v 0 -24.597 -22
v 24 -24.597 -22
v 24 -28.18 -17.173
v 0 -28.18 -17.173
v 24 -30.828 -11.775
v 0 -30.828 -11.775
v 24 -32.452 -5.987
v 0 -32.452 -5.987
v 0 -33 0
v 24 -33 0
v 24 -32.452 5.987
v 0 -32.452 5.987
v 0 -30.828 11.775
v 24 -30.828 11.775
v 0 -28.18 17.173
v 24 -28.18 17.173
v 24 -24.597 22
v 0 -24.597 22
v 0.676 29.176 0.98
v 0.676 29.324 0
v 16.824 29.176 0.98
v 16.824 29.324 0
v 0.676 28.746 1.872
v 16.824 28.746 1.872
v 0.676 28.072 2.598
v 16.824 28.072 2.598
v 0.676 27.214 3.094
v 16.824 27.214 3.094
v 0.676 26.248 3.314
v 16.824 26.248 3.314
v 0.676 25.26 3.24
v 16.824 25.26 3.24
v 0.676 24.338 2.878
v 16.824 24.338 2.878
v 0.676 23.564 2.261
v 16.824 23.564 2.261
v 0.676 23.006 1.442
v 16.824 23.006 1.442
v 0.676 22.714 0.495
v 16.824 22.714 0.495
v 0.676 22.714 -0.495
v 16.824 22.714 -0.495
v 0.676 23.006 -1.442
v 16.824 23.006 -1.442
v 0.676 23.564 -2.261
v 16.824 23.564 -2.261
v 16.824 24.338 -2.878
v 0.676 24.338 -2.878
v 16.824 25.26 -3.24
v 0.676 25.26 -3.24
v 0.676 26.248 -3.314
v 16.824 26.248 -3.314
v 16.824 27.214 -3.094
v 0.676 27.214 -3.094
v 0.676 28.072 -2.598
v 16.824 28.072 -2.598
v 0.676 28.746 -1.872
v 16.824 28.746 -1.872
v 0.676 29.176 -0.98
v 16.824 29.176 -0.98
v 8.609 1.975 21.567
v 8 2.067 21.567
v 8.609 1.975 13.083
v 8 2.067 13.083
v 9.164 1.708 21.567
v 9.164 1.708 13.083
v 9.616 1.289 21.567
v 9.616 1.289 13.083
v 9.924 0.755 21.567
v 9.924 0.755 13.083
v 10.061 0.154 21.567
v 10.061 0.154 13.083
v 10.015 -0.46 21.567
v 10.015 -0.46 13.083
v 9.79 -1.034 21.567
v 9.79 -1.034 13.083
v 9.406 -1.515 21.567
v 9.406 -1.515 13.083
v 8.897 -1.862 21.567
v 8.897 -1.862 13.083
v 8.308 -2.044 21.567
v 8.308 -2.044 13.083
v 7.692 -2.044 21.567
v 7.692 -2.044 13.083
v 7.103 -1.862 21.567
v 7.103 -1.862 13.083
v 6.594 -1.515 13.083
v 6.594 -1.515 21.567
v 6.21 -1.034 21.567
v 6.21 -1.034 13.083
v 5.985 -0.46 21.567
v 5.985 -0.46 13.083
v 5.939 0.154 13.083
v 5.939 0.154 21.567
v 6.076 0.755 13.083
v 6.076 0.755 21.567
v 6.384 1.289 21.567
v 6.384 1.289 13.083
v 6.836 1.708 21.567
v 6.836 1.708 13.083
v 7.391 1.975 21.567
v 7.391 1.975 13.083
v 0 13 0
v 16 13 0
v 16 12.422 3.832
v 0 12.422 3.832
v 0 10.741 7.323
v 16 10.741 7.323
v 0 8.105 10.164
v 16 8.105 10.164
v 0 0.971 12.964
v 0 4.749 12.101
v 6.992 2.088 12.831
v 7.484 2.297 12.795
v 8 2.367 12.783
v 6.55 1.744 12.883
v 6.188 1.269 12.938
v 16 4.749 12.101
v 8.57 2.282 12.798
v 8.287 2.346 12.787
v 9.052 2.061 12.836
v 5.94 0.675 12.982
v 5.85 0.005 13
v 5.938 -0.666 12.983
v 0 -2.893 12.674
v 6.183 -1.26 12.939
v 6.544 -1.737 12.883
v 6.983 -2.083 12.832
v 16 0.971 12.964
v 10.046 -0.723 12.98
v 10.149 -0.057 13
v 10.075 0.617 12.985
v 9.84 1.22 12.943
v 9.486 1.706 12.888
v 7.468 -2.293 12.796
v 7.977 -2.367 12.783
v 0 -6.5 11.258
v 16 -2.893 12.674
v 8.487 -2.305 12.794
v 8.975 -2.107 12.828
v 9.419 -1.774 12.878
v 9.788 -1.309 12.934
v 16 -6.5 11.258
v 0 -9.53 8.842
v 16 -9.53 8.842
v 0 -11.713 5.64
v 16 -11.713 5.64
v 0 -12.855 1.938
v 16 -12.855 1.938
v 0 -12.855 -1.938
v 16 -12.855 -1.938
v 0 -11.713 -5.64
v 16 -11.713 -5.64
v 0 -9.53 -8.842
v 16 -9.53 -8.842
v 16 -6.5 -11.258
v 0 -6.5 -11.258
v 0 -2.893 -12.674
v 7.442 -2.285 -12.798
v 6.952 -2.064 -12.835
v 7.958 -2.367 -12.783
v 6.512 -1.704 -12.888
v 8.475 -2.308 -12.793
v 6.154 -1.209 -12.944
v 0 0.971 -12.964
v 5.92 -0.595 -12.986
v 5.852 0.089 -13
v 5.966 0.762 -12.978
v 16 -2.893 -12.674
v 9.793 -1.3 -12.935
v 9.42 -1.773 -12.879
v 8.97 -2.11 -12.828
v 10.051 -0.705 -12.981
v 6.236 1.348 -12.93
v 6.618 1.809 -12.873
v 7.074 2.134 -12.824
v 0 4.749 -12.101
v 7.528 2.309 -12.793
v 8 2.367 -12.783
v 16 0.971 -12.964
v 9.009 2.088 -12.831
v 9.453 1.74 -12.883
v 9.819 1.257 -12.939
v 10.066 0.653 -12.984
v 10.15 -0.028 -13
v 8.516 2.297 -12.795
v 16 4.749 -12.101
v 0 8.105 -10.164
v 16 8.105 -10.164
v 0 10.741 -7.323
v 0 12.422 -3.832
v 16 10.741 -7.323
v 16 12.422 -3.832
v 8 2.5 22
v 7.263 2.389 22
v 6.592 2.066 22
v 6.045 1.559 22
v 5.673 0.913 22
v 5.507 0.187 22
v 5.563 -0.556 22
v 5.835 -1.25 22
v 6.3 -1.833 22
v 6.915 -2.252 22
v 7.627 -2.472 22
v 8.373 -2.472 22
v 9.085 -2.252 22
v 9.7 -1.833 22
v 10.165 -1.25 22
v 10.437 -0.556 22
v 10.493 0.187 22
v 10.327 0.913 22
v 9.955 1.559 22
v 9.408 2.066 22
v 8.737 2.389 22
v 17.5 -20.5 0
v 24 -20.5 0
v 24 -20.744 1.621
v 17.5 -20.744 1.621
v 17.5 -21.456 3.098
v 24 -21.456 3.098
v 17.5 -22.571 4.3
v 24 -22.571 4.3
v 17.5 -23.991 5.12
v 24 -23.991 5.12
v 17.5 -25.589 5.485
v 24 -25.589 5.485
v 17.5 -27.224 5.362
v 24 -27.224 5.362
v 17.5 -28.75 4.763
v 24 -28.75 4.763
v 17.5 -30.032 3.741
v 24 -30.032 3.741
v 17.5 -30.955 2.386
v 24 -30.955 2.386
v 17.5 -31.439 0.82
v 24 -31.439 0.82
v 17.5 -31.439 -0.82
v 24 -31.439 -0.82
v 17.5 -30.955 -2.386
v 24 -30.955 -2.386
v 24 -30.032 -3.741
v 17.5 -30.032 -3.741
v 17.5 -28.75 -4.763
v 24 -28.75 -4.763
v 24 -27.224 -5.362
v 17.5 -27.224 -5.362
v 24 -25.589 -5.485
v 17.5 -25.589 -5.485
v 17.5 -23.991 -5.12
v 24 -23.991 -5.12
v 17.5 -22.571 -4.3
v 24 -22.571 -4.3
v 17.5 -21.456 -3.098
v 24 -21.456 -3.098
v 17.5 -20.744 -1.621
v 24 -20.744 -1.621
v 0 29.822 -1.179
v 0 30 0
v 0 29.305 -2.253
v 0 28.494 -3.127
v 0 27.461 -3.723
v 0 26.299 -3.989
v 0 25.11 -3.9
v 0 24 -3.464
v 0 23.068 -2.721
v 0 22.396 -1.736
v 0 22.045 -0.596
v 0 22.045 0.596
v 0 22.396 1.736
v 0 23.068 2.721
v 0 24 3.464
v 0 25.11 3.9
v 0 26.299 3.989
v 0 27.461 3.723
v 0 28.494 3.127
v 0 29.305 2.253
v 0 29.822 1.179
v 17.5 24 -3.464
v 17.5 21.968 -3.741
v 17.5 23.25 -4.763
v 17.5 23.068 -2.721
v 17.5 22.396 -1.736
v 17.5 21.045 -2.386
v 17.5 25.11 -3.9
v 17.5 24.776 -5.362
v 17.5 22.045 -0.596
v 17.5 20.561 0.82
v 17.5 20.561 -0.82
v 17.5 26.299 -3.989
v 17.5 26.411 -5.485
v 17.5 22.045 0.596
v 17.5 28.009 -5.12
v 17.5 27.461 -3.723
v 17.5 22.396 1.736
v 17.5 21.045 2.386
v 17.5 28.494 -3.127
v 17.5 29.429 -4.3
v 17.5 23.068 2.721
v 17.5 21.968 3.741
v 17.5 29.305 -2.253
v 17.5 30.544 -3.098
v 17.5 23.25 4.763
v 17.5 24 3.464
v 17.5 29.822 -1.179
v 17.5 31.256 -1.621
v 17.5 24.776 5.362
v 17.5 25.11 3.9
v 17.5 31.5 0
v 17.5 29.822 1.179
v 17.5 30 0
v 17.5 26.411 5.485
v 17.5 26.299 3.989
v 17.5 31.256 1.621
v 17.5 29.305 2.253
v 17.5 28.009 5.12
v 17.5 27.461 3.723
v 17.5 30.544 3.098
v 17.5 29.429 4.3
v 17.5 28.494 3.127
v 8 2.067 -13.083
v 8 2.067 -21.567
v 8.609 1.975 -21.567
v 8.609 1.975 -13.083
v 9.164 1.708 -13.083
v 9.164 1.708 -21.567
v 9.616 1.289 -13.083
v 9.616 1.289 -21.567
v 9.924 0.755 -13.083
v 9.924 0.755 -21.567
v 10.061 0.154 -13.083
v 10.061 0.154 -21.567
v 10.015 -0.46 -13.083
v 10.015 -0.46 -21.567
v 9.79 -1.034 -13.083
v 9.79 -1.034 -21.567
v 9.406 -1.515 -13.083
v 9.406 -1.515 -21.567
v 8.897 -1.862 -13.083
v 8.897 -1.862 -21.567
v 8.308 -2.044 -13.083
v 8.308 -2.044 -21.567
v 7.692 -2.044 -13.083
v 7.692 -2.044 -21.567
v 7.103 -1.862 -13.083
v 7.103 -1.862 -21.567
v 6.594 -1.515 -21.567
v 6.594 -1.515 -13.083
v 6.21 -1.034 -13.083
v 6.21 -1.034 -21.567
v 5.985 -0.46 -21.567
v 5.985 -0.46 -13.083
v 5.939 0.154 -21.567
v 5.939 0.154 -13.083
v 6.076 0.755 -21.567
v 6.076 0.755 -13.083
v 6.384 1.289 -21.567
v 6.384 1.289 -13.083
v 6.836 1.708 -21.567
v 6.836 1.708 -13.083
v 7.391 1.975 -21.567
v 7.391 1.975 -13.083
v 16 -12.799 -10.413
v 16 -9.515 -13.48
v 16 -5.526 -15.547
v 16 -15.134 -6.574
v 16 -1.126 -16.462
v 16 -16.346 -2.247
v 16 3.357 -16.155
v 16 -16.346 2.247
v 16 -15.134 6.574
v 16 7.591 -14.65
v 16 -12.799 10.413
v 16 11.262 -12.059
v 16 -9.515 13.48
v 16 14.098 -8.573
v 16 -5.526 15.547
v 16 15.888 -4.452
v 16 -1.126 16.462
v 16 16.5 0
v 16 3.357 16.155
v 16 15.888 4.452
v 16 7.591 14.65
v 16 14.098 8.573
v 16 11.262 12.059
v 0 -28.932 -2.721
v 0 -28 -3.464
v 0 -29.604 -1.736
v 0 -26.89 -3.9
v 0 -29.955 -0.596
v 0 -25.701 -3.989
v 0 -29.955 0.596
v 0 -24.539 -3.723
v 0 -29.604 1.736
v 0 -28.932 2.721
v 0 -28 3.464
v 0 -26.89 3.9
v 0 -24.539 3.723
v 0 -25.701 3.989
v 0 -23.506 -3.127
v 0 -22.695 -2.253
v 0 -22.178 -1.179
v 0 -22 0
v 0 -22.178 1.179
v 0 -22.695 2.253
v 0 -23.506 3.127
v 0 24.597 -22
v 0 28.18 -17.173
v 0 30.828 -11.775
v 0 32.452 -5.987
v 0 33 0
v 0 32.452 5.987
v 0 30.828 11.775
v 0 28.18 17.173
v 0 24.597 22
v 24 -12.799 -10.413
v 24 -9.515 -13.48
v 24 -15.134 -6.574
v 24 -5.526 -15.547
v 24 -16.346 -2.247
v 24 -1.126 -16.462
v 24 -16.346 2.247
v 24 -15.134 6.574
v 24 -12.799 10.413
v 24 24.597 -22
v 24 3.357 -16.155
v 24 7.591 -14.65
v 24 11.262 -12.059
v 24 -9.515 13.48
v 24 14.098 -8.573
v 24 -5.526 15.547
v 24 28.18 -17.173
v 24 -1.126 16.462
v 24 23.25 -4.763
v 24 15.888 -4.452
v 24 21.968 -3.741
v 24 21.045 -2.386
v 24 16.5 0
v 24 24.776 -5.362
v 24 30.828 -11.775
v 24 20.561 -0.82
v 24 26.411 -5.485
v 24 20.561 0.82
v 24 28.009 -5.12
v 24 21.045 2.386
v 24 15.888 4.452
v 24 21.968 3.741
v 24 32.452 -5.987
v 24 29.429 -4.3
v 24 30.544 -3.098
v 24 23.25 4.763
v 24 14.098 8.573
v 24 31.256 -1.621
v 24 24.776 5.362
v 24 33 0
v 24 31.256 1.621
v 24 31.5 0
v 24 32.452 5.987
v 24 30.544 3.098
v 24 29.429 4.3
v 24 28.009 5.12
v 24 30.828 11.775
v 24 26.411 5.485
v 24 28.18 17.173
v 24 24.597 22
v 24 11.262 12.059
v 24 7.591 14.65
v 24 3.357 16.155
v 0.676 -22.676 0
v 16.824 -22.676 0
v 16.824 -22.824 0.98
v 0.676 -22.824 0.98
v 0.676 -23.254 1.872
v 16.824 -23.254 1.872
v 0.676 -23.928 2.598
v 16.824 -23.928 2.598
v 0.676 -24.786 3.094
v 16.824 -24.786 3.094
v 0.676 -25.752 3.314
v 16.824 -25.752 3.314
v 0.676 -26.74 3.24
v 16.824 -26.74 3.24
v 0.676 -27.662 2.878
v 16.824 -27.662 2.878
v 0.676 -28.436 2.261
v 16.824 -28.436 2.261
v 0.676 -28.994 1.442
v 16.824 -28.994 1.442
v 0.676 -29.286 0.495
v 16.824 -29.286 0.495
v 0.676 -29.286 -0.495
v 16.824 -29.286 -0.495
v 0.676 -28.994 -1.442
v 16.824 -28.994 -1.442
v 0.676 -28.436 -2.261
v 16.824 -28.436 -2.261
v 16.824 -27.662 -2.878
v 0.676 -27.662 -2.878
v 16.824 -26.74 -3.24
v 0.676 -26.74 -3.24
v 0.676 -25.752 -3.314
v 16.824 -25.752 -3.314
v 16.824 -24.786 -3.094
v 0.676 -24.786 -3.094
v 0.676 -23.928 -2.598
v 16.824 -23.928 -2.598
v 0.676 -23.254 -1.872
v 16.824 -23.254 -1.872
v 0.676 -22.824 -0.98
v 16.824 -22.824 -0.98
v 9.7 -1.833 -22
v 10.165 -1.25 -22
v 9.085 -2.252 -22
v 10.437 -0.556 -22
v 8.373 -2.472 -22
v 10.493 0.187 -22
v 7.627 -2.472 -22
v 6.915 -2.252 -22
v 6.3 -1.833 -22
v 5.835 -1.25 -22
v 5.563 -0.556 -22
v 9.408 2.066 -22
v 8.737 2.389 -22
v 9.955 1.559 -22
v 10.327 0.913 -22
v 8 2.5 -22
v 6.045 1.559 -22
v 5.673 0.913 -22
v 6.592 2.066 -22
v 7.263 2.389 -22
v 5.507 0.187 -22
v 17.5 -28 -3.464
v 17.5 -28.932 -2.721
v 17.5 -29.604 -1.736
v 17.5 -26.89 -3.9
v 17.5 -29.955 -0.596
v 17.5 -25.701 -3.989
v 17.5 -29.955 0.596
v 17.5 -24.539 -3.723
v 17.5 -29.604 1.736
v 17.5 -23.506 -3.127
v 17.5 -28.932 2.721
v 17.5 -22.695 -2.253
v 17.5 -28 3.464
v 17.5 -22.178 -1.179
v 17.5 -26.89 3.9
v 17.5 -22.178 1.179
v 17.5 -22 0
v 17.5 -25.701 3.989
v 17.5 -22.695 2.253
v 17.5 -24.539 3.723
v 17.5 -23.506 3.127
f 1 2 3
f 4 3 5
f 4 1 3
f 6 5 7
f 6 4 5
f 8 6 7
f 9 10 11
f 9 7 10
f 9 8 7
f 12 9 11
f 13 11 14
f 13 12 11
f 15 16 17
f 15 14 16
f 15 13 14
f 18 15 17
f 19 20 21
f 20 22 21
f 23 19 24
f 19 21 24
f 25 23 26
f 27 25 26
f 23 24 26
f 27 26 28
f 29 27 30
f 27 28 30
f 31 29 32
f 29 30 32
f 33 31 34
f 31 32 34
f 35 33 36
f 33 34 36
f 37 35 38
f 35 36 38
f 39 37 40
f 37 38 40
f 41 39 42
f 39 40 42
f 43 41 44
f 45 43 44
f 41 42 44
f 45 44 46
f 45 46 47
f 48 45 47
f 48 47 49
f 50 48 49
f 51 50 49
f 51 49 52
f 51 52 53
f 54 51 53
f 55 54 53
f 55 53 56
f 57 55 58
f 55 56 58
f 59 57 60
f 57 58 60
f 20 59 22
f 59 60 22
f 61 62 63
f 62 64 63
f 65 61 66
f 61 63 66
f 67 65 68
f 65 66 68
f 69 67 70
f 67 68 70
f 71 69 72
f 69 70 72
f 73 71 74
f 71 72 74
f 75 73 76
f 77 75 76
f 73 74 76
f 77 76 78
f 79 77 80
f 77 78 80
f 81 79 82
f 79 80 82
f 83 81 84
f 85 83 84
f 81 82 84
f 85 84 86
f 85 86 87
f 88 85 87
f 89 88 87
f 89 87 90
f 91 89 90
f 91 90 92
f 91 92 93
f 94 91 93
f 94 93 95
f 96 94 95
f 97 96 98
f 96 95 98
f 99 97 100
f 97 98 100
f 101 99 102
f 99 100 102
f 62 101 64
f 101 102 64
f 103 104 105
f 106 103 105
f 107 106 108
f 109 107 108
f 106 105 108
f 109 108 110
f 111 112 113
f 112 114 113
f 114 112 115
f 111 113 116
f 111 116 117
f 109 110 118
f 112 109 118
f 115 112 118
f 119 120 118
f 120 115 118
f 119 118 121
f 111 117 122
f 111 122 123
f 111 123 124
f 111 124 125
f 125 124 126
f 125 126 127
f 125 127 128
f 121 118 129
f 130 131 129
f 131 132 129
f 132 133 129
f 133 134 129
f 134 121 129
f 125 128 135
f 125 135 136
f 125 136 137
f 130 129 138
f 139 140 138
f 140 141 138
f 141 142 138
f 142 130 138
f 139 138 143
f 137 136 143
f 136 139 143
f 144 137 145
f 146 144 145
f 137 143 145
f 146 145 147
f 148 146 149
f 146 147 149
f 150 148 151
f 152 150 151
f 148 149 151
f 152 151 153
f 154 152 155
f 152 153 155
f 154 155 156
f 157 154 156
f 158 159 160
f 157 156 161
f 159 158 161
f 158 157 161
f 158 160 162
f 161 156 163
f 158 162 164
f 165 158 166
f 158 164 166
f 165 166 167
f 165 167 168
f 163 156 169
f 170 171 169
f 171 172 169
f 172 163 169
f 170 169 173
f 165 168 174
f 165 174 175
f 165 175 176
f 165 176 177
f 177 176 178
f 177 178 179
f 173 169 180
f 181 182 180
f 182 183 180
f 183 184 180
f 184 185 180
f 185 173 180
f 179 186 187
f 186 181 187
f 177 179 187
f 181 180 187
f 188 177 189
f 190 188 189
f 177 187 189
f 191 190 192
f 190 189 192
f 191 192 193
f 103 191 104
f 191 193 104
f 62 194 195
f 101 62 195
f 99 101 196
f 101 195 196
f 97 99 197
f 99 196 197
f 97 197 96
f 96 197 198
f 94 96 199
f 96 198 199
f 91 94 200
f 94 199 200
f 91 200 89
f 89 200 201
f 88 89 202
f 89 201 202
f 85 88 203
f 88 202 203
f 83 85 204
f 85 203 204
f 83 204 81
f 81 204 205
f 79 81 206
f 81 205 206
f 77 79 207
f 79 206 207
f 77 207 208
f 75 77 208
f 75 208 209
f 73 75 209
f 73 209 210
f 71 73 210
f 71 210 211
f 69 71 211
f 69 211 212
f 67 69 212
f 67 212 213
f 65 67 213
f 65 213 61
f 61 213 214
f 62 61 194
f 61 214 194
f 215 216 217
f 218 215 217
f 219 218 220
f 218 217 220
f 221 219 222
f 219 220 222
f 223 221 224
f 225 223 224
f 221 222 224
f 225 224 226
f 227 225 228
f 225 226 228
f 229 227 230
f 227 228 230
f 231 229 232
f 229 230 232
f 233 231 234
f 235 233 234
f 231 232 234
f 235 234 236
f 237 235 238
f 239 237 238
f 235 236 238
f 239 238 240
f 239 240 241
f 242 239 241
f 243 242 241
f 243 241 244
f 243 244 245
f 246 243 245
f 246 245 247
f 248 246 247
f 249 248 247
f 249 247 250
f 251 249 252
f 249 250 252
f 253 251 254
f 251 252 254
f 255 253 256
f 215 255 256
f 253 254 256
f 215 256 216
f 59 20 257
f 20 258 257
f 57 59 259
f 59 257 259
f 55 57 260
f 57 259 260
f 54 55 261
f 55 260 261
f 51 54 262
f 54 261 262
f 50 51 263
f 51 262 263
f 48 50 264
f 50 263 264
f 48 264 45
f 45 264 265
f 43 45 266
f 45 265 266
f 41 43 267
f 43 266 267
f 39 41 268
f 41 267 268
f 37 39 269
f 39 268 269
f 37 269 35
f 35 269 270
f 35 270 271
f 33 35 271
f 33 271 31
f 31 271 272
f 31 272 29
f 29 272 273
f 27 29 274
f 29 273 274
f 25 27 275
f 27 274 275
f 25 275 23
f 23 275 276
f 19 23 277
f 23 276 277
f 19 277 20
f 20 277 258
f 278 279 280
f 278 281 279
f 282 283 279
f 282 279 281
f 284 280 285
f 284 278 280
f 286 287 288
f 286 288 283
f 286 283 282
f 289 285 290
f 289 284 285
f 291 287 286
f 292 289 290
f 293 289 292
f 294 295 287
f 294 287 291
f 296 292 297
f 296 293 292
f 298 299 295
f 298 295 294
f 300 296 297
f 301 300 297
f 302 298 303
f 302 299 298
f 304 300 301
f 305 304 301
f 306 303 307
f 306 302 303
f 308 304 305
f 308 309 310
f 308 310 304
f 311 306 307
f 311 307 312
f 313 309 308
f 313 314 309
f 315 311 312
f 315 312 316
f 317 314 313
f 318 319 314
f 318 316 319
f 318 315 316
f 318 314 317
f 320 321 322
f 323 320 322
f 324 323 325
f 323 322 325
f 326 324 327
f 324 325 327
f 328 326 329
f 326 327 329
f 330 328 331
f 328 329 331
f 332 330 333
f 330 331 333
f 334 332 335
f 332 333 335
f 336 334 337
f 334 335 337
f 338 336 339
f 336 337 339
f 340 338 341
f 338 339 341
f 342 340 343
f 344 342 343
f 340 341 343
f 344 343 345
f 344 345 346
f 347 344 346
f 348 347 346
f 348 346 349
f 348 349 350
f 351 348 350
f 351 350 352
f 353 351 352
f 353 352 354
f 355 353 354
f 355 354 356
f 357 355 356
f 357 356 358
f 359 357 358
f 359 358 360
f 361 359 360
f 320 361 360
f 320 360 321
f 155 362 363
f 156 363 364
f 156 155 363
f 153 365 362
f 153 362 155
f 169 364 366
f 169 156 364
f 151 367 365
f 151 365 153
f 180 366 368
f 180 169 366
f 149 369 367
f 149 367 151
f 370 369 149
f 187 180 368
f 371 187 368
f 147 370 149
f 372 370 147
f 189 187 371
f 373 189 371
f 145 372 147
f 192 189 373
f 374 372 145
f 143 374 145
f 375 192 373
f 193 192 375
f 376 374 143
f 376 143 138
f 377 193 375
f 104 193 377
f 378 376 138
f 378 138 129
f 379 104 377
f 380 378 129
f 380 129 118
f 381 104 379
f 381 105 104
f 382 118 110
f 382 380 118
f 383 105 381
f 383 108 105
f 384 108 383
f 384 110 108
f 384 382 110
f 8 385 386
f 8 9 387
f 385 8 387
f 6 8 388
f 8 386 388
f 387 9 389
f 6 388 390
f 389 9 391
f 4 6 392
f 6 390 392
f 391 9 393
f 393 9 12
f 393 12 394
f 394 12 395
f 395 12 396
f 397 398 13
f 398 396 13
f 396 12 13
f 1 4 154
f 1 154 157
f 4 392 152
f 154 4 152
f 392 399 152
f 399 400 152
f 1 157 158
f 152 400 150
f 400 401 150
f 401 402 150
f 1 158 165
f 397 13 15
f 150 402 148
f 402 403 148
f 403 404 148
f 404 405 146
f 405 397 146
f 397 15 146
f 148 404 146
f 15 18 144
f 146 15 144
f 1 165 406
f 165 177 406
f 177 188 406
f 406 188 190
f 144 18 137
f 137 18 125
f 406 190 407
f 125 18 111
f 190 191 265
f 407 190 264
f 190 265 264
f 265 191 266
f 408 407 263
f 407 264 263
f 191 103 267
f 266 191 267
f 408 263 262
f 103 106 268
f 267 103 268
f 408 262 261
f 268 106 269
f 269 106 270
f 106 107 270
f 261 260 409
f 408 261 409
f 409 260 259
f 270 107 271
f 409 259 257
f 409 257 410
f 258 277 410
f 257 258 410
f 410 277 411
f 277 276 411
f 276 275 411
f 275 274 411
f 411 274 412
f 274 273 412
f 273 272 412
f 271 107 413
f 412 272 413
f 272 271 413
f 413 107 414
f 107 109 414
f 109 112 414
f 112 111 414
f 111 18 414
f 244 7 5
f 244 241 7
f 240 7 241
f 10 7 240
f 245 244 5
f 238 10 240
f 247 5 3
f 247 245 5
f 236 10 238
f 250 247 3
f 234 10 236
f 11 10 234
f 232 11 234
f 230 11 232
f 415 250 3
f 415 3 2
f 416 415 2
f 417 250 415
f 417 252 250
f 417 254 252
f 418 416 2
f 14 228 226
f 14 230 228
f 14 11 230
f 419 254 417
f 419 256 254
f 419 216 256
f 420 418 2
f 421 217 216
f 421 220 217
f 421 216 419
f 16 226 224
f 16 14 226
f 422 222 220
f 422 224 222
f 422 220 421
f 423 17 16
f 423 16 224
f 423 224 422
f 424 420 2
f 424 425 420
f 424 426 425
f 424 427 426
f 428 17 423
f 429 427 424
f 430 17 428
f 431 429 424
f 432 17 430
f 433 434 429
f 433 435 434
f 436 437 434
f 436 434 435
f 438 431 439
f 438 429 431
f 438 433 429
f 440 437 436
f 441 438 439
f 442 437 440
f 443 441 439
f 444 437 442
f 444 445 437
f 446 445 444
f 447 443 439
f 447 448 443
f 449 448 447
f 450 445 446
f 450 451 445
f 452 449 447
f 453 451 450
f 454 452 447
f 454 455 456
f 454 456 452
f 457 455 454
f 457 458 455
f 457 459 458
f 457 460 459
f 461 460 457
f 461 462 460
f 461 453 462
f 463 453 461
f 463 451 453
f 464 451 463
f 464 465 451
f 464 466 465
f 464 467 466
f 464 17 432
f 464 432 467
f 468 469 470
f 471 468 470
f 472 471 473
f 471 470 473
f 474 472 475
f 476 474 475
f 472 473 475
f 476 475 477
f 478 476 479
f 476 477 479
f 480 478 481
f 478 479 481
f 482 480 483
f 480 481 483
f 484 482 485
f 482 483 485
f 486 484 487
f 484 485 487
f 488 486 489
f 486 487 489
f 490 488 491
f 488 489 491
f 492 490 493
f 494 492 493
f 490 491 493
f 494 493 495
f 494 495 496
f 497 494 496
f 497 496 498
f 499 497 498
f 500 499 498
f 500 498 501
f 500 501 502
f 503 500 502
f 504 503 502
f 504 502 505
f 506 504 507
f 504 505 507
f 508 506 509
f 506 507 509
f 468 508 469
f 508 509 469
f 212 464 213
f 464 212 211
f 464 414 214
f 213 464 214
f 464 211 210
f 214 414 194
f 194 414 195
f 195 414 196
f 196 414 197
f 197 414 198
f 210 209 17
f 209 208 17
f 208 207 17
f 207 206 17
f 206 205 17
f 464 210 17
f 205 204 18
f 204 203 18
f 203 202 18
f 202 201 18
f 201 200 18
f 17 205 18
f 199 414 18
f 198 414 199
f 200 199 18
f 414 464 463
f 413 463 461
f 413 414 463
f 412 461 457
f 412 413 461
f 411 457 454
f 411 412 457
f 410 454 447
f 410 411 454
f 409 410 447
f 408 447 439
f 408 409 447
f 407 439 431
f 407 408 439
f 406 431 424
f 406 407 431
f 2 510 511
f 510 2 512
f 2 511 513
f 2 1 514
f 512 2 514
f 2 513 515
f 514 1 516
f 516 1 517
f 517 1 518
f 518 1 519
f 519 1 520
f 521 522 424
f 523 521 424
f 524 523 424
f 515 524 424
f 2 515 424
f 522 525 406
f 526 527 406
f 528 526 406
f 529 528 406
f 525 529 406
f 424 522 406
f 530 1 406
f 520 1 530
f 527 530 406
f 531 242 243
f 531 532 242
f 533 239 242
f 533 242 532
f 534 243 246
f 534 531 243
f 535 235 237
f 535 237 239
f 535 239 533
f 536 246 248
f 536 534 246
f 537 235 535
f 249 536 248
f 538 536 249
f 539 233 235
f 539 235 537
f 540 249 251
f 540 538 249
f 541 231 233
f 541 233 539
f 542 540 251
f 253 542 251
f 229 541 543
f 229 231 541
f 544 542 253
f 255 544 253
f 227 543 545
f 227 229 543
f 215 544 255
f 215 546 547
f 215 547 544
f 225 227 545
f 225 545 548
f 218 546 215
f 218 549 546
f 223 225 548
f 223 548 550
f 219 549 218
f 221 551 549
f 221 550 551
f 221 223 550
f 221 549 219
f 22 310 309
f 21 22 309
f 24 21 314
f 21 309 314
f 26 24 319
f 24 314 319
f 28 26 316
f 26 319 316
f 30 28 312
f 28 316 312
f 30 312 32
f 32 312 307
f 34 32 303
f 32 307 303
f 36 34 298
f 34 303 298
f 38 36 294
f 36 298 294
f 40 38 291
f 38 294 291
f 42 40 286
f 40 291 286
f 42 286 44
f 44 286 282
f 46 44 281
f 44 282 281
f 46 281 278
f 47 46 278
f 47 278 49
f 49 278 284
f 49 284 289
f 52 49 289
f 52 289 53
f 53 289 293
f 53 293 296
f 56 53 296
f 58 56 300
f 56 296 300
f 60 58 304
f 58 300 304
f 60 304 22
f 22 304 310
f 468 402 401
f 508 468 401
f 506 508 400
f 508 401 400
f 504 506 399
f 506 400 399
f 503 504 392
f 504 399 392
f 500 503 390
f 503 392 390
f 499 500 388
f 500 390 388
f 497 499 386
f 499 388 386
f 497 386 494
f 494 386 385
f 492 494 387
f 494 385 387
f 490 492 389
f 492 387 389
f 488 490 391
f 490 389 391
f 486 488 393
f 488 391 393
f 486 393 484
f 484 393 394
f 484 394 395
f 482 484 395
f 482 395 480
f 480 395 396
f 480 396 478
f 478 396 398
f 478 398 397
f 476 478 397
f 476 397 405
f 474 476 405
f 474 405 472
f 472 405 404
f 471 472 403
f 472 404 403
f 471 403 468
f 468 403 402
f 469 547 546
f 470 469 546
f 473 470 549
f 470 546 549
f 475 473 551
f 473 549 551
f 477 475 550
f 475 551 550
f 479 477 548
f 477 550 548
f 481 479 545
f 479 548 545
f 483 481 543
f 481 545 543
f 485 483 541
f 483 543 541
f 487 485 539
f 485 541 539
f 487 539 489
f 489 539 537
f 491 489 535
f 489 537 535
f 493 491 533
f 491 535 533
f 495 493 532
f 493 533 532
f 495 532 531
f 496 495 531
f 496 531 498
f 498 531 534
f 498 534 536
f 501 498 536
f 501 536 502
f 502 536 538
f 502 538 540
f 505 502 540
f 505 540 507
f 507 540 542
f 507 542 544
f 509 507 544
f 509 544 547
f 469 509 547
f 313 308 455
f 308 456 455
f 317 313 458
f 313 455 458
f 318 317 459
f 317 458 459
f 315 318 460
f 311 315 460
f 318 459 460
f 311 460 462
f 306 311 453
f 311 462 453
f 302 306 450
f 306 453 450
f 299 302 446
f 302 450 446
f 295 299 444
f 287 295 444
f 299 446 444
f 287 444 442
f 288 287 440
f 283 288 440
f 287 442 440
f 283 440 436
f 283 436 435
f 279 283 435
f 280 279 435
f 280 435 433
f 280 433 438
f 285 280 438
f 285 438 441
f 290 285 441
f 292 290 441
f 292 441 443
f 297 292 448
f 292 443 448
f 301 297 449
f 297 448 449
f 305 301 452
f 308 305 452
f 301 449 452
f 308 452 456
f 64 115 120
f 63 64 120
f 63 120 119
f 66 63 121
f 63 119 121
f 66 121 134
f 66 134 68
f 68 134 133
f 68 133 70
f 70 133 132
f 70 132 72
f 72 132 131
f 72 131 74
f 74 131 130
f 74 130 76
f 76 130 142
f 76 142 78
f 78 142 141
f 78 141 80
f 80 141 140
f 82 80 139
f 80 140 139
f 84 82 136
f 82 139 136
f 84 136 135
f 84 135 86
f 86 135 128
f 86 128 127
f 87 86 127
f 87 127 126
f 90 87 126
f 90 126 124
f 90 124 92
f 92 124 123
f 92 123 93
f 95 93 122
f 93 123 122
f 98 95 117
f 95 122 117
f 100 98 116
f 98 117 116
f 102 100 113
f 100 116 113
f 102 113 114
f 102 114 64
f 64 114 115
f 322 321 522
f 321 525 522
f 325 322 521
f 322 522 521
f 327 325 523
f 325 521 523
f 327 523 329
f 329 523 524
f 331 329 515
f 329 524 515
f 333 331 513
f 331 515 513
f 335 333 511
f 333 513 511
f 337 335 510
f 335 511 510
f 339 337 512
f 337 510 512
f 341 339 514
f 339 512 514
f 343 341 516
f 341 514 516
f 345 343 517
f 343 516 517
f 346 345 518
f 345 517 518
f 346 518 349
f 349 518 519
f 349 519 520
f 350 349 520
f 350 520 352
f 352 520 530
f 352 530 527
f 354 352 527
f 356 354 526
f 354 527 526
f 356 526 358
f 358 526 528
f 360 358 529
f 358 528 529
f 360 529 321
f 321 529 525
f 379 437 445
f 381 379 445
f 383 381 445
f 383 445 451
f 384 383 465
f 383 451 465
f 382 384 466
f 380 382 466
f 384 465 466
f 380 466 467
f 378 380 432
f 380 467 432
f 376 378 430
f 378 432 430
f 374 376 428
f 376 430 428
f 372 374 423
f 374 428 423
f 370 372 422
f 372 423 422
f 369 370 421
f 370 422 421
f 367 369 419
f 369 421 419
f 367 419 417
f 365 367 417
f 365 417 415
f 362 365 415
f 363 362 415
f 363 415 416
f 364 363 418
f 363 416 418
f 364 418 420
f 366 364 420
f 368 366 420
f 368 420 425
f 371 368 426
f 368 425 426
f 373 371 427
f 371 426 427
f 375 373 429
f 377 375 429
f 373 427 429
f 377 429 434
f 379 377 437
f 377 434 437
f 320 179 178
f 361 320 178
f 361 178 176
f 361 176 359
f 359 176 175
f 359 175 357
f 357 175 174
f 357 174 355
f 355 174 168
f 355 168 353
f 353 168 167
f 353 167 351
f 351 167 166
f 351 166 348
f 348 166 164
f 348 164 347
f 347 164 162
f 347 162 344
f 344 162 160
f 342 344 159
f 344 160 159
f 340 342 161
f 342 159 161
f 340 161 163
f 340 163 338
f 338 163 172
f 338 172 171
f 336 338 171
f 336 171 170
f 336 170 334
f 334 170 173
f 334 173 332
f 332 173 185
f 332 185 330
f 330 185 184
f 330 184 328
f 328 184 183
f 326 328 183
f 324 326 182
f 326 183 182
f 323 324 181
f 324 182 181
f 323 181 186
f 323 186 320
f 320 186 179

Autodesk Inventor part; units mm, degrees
sketch "Sketch_1" plane through (0, 0, 0) normal (0, 0, 1) x (1, 0, 0)
  line L0 (24, 0) -> (0, 0)
  line L1 (0, 33) -> (0, 13)
  line L2 (0, 13) -> (16, 13)
  line L3 (16, 13) -> (16, 16.5)
  line L4 (16, 16.5) -> (24, 16.5)
  line L5 (24, 16.5) -> (24, 33)
  line L6 (24, 33) -> (0, 33)
revolve "Revolution1" add sketch "Sketch_1" angle 360 about axis through (24, 0, 0) along (1, 0, 0)
sketch "Sketch_2" plane through (0, 0, 0) normal (1, 0, 0) x (0, 1, 0)
  line L0 (-132, 88) -> (-132, -88)
  line L1 (-132, -88) -> (132, -88)
  line L2 (132, -88) -> (132, 88)
  line L3 (132, 88) -> (-132, 88)
  line L4 (-33, 22) -> (-33, -22)
  line L5 (-33, -22) -> (33, -22)
  line L6 (33, -22) -> (33, 22)
  line L7 (33, 22) -> (-33, 22)
extrude "Extrusion1" cut sketch "Sketch_2" along normal blind 26
sketch "Sketch_3" plane through (0, 0, 0) normal (0, 0, 1) x (1, 0, 0)
  line L0 (24, 26) -> (0, 26)
  line L1 (0, 26) -> (0, 30)
  line L2 (0, 30) -> (0.6765, 29.3235)
  line L3 (0.6765, 29.3235) -> (16.8235, 29.3235)
  line L4 (16.8235, 29.3235) -> (17.5, 30)
  line L5 (17.5, 30) -> (17.5, 31.5)
  line L6 (17.5, 31.5) -> (24, 31.5)
  line L7 (24, 31.5) -> (24, 26)
  line L8 (24, 26) -> (0, 26)
revolve "Revolution2" cut sketch "Sketch_3" angle 360 about axis through (24, 26, 0) along (1, 0, 0)
thread "Thread1" size "M8x1.25" class "6H" standard "ISO Metric profile" full length
pattern_linear "Rectangular Pattern1" count 2 spacing 52 along (0, -1, 0) of "Revolution2"
sketch "Sketch_4" plane through (8, 0, 0) normal (1, 0, 0) x (0, 0, -1)
  line L0 (-12.65, 0) -> (-22, 0)
  line L1 (-22, 0) -> (-22, 2.5)
  line L2 (-22, 2.5) -> (-21.567, 2.067)
  line L3 (-21.567, 2.067) -> (-13.083, 2.067)
  line L4 (-13.083, 2.067) -> (-12.65, 2.5)
  line L5 (-12.65, 2.5) -> (-12.65, 0)
  line L6 (-12.65, 0) -> (-22, 0)
revolve "Revolution3" cut sketch "Sketch_4" angle 360 about axis through (8, 0, 12.65) along (0, 0, -1)
thread "Thread2" size "M5x0.8" class "6H" standard "ISO Metric profile" full length
sketch "Sketch_6" plane through (8, 0, 0) normal (1, 0, 0) x (0, 0, -1)
  line L0 (22, 0) -> (12.65, 0)
  line L1 (12.65, 0) -> (12.65, 2.5)
  line L2 (12.65, 2.5) -> (13.083, 2.067)
  line L3 (13.083, 2.067) -> (21.567, 2.067)
  line L4 (21.567, 2.067) -> (22, 2.5)
  line L5 (22, 2.5) -> (22, 0)
  line L6 (22, 0) -> (12.65, 0)
revolve "Revolution4" cut sketch "Sketch_6" angle 360 about axis through (8, 0, -22) along (0, 0, -1)
thread "Thread3" size "M5x0.8" class "6H" standard "ISO Metric profile" full length
ref_plane "to_bearings_XY" through (16, 0, 0) normal (1, 0, 0) x (0, 0, -1)
ref_plane "to_bearings_YZ" through (16, 0, 0) normal (0, 0, -1) x (0, 1, 0)
ref_plane "to_bearings_ZX" through (16, 0, 0) normal (0, 1, 0) x (1, 0, 0)
ref_plane "to_screw1_XY" through (8, 0, 13) normal (0, 0, 1) x (1, 0, 0)
ref_plane "to_screw1_YZ" through (8, 0, 13) normal (1, 0, 0) x (0, 1, 0)
ref_plane "to_screw1_ZX" through (8, 0, 13) normal (0, 1, 0) x (0, 0, 1)
ref_plane "to_screw2_XY" through (8, 0, -13) normal (0, 0, -1) x (1, 0, 0)
ref_plane "to_screw2_YZ" through (8, 0, -13) normal (1, 0, 0) x (0, -1, 0)
ref_plane "to_screw2_ZX" through (8, 0, -13) normal (0, -1, 0) x (0, 0, -1)
properties part number "BGCSB14_h"
